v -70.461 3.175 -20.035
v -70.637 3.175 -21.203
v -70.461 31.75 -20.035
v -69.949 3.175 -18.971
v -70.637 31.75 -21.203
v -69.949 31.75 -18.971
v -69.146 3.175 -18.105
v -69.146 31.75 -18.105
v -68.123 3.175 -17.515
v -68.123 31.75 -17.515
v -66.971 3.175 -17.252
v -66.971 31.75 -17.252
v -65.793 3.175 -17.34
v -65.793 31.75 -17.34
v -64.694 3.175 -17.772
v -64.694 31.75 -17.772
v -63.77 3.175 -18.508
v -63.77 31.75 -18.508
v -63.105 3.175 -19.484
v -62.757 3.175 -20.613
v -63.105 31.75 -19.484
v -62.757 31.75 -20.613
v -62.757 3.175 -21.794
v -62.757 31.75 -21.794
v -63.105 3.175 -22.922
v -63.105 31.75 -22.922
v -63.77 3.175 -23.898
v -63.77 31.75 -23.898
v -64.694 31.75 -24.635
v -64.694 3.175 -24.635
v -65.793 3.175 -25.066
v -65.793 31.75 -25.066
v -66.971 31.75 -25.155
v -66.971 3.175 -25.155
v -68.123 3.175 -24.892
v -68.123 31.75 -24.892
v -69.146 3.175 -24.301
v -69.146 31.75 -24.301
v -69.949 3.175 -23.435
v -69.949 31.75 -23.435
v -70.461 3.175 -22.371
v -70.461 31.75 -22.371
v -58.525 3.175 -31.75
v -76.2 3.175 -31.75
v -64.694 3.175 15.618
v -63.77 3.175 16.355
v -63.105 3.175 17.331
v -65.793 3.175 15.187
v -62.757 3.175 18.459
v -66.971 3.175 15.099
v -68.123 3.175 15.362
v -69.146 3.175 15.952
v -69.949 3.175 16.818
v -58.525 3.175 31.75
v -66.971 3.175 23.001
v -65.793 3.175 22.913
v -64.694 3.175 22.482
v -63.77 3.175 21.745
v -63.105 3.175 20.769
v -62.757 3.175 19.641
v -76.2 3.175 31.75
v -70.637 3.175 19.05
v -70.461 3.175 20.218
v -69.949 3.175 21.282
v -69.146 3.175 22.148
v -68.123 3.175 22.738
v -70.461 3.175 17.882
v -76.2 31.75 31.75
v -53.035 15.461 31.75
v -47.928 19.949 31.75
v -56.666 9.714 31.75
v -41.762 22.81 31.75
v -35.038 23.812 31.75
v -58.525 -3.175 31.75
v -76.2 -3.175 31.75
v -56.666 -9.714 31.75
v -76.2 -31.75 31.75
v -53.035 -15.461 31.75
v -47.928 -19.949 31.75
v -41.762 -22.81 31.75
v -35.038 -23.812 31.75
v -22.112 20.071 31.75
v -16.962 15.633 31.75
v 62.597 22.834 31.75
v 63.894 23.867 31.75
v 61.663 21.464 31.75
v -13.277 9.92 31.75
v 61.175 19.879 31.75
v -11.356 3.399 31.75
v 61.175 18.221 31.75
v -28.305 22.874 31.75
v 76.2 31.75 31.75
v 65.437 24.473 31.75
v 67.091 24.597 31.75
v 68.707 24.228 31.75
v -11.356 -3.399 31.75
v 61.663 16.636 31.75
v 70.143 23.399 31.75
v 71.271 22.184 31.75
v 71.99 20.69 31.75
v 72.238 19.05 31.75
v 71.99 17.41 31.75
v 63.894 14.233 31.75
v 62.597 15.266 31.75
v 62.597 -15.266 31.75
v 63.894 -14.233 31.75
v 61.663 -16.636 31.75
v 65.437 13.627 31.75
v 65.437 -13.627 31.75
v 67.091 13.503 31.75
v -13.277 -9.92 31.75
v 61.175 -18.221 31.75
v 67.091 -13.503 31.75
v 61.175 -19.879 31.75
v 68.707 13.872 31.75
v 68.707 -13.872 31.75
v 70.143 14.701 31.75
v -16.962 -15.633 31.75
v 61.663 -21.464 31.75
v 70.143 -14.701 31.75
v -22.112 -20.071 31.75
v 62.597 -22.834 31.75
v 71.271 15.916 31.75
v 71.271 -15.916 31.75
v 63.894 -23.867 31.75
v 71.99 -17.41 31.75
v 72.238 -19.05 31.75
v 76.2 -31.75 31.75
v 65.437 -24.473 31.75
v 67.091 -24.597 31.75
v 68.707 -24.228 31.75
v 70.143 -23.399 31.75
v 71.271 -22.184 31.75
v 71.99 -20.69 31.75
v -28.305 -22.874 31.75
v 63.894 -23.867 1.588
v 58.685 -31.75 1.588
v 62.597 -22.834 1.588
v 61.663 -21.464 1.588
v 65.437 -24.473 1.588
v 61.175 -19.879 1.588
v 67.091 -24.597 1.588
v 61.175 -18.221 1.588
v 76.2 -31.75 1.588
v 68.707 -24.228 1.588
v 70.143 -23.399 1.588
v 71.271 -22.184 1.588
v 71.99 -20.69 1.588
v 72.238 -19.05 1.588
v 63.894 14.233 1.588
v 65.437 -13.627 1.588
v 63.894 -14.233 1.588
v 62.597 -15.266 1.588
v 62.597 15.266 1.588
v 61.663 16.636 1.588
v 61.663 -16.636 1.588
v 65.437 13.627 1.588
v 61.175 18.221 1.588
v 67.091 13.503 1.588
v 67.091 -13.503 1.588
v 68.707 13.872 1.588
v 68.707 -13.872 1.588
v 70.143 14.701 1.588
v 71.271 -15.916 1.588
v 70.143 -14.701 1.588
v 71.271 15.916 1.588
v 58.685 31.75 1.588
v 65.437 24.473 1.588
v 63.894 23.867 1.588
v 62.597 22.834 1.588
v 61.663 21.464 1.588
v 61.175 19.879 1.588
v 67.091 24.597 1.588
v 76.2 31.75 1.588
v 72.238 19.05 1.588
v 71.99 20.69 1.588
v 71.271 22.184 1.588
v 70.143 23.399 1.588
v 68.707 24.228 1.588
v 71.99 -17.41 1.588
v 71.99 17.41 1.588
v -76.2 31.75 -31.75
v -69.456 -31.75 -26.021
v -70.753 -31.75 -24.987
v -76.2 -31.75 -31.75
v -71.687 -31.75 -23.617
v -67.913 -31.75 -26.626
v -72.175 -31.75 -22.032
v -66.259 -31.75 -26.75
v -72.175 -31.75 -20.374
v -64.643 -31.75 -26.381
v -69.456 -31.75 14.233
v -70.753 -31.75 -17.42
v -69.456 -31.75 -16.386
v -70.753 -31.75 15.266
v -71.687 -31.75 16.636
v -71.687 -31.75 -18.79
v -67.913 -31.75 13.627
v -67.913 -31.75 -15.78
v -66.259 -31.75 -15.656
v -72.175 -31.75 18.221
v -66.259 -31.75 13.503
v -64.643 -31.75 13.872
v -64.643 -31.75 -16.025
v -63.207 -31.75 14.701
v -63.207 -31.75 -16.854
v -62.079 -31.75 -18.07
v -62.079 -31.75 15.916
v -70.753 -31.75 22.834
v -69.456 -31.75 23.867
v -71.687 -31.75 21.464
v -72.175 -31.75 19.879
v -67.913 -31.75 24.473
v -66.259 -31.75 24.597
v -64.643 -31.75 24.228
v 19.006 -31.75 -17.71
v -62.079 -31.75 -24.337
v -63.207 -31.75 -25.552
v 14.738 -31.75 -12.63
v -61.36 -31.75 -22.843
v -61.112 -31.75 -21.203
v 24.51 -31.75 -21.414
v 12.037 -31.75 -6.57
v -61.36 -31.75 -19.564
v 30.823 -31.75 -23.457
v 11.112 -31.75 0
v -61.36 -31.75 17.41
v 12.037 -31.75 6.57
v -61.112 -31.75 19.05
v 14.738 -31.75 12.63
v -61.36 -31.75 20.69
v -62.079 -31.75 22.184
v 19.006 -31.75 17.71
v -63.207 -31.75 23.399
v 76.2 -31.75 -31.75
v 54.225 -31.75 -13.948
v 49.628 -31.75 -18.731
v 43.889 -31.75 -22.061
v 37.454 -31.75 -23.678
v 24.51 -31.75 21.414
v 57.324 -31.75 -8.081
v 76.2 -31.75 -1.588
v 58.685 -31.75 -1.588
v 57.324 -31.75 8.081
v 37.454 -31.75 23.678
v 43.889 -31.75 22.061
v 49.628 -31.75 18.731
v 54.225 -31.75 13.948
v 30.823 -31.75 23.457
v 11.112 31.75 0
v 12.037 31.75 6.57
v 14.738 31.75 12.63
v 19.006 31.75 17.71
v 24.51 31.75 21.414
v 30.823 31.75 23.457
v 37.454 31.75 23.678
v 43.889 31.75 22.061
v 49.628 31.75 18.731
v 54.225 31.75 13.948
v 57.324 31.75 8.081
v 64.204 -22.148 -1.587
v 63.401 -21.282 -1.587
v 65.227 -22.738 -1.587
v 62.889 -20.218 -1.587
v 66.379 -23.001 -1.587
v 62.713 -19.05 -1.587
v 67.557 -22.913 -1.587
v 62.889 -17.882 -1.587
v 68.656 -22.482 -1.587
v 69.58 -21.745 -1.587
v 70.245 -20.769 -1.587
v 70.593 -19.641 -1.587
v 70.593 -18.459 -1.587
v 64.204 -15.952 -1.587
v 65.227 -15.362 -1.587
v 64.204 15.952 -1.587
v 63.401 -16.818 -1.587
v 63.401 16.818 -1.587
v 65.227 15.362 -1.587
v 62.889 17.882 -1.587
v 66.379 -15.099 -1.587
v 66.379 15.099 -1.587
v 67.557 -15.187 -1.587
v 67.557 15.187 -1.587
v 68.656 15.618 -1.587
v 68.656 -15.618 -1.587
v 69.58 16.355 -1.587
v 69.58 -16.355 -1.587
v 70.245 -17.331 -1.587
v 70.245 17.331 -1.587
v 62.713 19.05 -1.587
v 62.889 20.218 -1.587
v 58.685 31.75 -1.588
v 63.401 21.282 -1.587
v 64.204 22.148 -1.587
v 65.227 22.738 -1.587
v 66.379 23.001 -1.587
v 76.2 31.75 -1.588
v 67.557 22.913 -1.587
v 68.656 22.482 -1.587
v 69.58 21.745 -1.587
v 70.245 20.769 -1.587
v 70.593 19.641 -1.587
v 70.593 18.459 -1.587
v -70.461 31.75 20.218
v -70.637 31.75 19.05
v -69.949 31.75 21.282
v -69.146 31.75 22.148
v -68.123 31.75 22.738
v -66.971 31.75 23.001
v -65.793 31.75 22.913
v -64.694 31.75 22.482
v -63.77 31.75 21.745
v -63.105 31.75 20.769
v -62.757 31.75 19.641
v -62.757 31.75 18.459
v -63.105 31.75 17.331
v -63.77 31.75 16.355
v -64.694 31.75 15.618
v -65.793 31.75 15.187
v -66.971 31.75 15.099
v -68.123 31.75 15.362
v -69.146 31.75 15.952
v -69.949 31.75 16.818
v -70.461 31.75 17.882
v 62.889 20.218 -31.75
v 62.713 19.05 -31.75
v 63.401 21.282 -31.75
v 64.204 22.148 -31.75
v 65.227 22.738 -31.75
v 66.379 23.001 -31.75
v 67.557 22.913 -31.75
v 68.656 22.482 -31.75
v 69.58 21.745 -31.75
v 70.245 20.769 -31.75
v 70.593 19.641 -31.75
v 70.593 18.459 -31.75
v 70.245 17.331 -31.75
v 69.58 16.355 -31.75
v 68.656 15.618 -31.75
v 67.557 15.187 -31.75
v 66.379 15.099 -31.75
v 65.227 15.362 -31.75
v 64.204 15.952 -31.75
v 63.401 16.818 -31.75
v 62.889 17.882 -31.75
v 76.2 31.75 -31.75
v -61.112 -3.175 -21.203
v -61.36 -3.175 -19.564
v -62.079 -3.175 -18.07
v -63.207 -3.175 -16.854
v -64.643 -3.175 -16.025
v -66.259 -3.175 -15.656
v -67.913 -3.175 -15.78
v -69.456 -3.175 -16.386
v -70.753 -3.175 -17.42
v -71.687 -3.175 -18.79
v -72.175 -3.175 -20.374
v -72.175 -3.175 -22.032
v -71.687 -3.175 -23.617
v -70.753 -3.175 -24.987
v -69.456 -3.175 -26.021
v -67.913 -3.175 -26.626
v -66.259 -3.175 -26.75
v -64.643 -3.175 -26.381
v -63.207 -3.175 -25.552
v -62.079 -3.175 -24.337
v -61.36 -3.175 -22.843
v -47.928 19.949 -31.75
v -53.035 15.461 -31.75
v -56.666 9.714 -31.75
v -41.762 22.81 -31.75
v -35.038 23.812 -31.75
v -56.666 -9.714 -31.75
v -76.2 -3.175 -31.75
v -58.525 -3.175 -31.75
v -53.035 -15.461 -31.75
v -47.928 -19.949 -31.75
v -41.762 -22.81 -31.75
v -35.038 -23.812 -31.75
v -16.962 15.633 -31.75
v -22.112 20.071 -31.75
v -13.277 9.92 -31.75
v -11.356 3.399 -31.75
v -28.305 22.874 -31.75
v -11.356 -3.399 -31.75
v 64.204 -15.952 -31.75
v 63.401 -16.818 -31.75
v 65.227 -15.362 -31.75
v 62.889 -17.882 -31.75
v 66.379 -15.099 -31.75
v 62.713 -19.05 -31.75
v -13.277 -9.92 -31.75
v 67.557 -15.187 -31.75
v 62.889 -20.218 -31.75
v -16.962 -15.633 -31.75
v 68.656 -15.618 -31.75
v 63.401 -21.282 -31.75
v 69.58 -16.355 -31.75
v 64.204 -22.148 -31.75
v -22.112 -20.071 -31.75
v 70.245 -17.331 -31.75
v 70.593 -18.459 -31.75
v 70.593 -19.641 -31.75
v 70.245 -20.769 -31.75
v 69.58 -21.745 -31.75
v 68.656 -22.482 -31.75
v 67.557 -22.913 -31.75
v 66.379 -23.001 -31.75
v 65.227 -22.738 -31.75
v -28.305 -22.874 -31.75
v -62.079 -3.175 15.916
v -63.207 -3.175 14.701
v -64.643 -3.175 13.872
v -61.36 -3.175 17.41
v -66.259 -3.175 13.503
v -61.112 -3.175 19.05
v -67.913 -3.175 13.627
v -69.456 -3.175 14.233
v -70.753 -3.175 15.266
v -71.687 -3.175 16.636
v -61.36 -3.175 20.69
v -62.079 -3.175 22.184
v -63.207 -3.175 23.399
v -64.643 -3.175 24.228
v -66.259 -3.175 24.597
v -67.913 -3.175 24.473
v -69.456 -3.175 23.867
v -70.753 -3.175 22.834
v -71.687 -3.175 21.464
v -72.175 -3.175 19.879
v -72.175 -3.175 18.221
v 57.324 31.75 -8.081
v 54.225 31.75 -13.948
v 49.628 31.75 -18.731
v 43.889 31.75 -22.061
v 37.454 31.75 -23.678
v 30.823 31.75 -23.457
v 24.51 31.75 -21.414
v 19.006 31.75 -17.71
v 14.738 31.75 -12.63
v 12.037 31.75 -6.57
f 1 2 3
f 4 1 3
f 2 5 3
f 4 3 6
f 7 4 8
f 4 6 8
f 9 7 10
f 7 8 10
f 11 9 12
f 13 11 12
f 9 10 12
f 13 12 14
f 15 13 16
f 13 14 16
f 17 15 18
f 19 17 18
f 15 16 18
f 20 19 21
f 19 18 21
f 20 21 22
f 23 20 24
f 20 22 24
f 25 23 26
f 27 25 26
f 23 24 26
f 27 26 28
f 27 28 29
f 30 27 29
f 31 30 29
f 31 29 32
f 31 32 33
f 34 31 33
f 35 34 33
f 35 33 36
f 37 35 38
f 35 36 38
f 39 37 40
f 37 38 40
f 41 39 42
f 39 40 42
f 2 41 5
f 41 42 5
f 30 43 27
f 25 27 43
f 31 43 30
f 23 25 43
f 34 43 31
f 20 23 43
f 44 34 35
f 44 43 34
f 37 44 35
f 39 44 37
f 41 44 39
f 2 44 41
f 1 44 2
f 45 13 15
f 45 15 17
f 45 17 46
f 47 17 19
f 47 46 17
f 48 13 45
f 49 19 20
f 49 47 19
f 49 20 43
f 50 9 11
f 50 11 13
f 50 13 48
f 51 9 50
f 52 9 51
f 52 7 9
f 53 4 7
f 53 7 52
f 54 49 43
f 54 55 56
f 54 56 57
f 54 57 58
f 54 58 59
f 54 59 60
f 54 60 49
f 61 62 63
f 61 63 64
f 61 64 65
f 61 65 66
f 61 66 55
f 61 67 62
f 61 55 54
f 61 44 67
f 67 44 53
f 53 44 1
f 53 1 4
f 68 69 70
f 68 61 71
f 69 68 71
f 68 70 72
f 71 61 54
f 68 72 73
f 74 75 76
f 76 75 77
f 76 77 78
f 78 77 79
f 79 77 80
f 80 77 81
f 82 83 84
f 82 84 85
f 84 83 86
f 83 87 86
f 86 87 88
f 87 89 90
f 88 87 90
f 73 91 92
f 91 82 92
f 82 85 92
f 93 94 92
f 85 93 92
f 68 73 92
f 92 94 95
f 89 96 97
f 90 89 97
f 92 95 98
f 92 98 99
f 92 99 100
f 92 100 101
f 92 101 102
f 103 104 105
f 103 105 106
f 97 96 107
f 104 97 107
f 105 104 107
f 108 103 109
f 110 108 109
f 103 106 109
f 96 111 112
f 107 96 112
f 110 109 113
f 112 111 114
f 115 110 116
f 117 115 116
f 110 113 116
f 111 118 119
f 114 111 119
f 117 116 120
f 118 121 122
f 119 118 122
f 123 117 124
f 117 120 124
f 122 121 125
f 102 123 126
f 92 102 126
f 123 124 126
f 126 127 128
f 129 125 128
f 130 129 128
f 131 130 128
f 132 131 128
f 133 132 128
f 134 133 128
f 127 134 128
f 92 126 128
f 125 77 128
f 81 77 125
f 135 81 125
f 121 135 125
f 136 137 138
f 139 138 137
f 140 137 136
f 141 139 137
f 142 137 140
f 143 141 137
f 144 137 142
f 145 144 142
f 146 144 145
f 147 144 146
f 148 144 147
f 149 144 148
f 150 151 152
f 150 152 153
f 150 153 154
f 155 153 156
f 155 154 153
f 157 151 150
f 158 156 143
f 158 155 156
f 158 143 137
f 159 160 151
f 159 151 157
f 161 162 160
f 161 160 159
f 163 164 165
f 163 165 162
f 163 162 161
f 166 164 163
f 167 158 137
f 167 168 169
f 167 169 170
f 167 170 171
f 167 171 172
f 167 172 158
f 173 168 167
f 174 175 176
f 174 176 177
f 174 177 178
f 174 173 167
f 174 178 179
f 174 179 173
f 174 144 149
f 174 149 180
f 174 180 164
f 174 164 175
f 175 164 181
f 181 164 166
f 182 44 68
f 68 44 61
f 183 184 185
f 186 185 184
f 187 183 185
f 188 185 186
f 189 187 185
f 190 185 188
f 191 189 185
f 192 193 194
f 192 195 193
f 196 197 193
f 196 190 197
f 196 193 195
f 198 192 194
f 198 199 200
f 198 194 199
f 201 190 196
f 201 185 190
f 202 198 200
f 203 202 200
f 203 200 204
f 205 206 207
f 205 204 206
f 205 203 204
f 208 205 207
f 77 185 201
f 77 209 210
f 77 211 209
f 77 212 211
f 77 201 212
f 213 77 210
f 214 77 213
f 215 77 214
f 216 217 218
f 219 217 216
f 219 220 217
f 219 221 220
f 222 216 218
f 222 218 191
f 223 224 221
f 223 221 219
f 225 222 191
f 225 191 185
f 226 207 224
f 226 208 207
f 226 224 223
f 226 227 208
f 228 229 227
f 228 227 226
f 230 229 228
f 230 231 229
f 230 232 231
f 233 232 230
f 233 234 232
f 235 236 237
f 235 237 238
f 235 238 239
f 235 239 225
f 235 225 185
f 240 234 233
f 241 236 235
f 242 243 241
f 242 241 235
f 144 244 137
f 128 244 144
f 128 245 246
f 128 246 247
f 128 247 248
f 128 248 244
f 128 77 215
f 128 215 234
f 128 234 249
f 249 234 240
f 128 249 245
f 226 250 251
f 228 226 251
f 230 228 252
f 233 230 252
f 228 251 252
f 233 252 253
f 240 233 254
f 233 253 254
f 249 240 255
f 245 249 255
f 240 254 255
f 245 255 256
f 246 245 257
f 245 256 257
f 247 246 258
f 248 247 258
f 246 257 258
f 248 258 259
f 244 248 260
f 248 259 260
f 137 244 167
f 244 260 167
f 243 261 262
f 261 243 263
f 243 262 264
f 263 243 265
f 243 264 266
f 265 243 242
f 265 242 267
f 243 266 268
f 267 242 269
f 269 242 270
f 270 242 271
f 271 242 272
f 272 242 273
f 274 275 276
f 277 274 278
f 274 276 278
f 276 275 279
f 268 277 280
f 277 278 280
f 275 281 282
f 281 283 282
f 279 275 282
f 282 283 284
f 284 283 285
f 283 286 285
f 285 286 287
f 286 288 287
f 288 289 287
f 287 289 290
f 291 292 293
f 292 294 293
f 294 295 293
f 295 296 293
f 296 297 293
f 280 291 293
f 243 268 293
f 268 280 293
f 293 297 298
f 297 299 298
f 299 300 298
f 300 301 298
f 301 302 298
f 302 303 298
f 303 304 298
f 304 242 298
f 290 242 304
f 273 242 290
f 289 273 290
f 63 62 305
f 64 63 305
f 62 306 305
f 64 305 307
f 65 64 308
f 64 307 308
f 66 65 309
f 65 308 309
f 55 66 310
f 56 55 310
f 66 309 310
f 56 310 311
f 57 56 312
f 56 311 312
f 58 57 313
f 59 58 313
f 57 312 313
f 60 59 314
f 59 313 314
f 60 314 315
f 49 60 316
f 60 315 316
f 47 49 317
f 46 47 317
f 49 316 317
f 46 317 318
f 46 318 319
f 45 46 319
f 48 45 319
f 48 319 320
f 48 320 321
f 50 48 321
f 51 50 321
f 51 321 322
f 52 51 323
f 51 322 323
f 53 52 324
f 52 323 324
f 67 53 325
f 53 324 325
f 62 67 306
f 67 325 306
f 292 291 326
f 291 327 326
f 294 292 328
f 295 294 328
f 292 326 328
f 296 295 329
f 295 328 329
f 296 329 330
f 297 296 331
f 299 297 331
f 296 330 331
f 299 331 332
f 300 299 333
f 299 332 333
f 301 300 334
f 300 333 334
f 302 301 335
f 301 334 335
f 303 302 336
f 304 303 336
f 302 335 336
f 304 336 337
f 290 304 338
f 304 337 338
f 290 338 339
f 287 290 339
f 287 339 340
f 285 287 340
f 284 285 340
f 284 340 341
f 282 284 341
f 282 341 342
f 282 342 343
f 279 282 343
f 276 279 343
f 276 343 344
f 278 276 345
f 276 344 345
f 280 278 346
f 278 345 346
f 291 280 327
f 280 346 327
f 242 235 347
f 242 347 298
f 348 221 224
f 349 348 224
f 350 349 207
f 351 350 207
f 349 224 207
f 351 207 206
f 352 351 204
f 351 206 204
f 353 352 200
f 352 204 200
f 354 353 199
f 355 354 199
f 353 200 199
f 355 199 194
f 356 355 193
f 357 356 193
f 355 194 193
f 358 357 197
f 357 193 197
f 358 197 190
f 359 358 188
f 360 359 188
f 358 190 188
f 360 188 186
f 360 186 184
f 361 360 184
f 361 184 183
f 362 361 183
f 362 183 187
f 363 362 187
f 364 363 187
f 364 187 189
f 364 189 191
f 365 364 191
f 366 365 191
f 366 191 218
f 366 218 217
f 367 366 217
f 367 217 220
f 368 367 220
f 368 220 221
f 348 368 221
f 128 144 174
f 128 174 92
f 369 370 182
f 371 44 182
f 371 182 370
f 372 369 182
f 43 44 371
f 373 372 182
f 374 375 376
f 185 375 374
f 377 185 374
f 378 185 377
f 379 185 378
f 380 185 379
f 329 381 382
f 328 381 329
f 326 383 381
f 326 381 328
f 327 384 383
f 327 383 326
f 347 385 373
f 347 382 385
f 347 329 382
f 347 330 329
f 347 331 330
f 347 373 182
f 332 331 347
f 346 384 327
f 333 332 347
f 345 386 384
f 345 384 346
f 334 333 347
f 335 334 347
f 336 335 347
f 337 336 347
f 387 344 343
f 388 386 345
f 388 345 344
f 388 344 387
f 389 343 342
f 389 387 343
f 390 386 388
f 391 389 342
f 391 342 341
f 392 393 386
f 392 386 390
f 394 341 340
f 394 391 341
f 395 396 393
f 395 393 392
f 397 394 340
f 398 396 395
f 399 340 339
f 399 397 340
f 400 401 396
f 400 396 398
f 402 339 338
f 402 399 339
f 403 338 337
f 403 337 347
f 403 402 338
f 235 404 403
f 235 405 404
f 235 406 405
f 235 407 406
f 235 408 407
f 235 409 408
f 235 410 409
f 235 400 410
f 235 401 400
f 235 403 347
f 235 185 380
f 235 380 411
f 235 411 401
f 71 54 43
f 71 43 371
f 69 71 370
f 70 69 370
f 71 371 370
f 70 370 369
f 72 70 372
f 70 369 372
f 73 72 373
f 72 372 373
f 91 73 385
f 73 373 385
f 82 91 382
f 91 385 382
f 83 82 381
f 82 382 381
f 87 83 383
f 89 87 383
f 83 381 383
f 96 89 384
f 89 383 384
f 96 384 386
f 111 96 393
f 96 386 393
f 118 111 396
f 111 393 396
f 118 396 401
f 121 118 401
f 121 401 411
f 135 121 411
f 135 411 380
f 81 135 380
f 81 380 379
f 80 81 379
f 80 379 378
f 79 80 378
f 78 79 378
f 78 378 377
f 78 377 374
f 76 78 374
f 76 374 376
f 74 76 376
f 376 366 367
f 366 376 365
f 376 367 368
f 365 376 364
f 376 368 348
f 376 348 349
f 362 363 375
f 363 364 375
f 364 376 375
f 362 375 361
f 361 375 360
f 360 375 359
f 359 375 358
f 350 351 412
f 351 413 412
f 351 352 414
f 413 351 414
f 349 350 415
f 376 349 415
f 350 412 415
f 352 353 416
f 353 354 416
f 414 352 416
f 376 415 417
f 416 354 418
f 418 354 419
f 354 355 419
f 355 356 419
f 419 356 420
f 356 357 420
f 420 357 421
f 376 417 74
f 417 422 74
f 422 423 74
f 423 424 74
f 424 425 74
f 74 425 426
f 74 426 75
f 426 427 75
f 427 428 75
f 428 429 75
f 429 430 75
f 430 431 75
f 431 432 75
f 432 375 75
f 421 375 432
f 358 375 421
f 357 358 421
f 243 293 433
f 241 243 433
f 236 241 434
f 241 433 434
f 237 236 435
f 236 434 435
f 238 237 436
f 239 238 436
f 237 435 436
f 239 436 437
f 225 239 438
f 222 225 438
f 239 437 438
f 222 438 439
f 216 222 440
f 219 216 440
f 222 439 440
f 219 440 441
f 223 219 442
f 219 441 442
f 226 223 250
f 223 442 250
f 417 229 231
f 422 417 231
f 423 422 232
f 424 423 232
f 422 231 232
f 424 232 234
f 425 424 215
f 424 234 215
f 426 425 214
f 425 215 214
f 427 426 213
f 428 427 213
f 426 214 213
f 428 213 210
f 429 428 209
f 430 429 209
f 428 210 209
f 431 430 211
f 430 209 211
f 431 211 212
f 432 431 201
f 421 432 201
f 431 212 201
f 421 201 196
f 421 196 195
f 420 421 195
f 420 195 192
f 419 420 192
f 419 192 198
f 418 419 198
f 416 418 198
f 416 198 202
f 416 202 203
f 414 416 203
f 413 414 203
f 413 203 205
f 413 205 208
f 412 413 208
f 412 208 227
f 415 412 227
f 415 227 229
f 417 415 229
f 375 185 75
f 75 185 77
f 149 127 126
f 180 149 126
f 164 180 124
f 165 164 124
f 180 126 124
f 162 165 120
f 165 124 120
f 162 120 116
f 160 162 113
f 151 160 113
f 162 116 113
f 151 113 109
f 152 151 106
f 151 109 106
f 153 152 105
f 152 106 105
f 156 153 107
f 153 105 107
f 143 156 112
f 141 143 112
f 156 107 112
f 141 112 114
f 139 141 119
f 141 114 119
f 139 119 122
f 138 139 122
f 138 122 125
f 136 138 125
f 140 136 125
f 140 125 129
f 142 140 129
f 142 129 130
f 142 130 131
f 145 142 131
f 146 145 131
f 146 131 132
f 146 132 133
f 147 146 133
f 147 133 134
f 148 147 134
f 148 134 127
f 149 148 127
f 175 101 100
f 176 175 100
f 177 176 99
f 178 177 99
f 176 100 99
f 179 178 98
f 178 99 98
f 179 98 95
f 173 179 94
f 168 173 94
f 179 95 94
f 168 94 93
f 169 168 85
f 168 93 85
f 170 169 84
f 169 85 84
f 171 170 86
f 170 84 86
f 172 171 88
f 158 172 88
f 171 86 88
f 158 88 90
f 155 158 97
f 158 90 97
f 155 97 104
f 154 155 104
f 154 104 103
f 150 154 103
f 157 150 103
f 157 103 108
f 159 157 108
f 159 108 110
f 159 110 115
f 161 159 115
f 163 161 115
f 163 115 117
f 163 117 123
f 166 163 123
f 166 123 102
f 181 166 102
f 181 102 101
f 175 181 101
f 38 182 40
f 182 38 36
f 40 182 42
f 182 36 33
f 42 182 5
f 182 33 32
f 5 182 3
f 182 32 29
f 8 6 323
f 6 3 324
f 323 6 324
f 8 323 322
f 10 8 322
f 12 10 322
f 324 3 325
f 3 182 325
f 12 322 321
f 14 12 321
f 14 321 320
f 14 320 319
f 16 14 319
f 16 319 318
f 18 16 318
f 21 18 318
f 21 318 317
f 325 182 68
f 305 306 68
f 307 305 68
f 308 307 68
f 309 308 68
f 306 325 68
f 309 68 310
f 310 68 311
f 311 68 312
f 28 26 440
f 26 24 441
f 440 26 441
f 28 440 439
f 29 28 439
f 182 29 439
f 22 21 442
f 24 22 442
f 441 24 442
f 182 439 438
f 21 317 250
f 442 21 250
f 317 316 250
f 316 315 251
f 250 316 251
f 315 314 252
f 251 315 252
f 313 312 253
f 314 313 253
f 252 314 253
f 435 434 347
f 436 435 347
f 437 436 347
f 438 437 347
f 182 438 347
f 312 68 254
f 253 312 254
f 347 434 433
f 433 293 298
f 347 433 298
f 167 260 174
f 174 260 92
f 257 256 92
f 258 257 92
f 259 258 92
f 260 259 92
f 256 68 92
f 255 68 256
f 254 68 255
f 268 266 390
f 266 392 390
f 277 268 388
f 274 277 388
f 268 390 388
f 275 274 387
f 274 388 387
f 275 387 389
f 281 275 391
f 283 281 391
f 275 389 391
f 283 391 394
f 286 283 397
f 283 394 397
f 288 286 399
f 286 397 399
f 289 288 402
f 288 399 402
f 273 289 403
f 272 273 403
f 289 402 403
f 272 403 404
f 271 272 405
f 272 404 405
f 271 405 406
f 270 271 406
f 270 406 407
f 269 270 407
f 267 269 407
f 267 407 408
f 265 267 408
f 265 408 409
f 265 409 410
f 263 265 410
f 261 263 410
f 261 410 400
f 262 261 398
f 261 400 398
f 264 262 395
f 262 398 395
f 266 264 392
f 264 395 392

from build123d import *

# Parameters (mm, degrees)
F0_W                  = 152.4
F0_H                  = 63.5
F1_DEPTH              = 31.75
F3_D                  = 47.625
F5_D                  = 47.625
F10_W                 = 63.5
F10_H                 = 3.175
F11_DEPTH             = 19.05
F12_D                 = 7.9248
F12_CBORE_D           = 11.1252
F12_CBORE_DEPTH       = 31.75
F12_ON_F7_D           = 7.9248
F12_ON_F7_CBORE_D     = 11.1252
F12_ON_F7_CBORE_DEPTH = 31.75
F12_ON_F8_D           = 7.9248
F12_ON_F8_CBORE_D     = 11.1252
F12_ON_F8_CBORE_DEPTH = 31.75
F12_ON_F9_D           = 7.9248
F12_ON_F9_CBORE_D     = 11.1252
F12_ON_F9_CBORE_DEPTH = 31.75
F13_W                 = 6.35
F13_H                 = 63.5
F14_DEPTH             = 50.8


with BuildPart() as f1:
    # F0 (on Front) → F1 (new body, symmetric)
    with BuildSketch(Plane.XZ):
        Rectangle(F0_W, F0_H)
    extrude(amount=F1_DEPTH, both=True)

    # F3 (through all)
    with Locations(Plane.XY.offset(31.75)):
        with Locations((-34.925, 0)):
            Hole(F3_D / 2)

    # F5 (through all)
    with Locations(Plane.XZ.offset(31.75)):
        with Locations((34.925, 0)):
            Hole(F5_D / 2)

    # F10 (on face) → F11 (cut, symmetric)
    with BuildSketch(Plane.YZ.offset(76.2)):
        Rectangle(F10_W, F10_H)
    extrude(amount=F11_DEPTH, both=True, mode=Mode.SUBTRACT)

    # F12 (through all)
    with Locations(Plane.XY.offset(31.75)):
        with Locations((66.675, 19.05)):
            CounterBoreHole(F12_D / 2, F12_CBORE_D / 2, F12_CBORE_DEPTH)

    # F12 on F7 (through all)
    with Locations(Plane.XY.offset(31.75)):
        with Locations((66.675, -19.05)):
            CounterBoreHole(F12_ON_F7_D / 2, F12_ON_F7_CBORE_D / 2, F12_ON_F7_CBORE_DEPTH)

    # F12 on F8 (through all)
    with Locations(Plane.XZ.offset(31.75)):
        with Locations((-66.675, 19.05)):
            CounterBoreHole(F12_ON_F8_D / 2, F12_ON_F8_CBORE_D / 2, F12_ON_F8_CBORE_DEPTH)

    # F12 on F9 (through all)
    with Locations(Plane.XZ.offset(31.75)):
        with Locations((-66.675, -21.2032347918)):
            CounterBoreHole(F12_ON_F9_D / 2, F12_ON_F9_CBORE_D / 2, F12_ON_F9_CBORE_DEPTH)

    # F13 (on face) → F14 (cut)
    with BuildSketch(Plane(origin=(-76.2, 0, 0), x_dir=(0, -1, 0), z_dir=(-1, 0, 0))):
        Rectangle(F13_W, F13_H)
    extrude(amount=-F14_DEPTH, mode=Mode.SUBTRACT)


solid = f1.part
